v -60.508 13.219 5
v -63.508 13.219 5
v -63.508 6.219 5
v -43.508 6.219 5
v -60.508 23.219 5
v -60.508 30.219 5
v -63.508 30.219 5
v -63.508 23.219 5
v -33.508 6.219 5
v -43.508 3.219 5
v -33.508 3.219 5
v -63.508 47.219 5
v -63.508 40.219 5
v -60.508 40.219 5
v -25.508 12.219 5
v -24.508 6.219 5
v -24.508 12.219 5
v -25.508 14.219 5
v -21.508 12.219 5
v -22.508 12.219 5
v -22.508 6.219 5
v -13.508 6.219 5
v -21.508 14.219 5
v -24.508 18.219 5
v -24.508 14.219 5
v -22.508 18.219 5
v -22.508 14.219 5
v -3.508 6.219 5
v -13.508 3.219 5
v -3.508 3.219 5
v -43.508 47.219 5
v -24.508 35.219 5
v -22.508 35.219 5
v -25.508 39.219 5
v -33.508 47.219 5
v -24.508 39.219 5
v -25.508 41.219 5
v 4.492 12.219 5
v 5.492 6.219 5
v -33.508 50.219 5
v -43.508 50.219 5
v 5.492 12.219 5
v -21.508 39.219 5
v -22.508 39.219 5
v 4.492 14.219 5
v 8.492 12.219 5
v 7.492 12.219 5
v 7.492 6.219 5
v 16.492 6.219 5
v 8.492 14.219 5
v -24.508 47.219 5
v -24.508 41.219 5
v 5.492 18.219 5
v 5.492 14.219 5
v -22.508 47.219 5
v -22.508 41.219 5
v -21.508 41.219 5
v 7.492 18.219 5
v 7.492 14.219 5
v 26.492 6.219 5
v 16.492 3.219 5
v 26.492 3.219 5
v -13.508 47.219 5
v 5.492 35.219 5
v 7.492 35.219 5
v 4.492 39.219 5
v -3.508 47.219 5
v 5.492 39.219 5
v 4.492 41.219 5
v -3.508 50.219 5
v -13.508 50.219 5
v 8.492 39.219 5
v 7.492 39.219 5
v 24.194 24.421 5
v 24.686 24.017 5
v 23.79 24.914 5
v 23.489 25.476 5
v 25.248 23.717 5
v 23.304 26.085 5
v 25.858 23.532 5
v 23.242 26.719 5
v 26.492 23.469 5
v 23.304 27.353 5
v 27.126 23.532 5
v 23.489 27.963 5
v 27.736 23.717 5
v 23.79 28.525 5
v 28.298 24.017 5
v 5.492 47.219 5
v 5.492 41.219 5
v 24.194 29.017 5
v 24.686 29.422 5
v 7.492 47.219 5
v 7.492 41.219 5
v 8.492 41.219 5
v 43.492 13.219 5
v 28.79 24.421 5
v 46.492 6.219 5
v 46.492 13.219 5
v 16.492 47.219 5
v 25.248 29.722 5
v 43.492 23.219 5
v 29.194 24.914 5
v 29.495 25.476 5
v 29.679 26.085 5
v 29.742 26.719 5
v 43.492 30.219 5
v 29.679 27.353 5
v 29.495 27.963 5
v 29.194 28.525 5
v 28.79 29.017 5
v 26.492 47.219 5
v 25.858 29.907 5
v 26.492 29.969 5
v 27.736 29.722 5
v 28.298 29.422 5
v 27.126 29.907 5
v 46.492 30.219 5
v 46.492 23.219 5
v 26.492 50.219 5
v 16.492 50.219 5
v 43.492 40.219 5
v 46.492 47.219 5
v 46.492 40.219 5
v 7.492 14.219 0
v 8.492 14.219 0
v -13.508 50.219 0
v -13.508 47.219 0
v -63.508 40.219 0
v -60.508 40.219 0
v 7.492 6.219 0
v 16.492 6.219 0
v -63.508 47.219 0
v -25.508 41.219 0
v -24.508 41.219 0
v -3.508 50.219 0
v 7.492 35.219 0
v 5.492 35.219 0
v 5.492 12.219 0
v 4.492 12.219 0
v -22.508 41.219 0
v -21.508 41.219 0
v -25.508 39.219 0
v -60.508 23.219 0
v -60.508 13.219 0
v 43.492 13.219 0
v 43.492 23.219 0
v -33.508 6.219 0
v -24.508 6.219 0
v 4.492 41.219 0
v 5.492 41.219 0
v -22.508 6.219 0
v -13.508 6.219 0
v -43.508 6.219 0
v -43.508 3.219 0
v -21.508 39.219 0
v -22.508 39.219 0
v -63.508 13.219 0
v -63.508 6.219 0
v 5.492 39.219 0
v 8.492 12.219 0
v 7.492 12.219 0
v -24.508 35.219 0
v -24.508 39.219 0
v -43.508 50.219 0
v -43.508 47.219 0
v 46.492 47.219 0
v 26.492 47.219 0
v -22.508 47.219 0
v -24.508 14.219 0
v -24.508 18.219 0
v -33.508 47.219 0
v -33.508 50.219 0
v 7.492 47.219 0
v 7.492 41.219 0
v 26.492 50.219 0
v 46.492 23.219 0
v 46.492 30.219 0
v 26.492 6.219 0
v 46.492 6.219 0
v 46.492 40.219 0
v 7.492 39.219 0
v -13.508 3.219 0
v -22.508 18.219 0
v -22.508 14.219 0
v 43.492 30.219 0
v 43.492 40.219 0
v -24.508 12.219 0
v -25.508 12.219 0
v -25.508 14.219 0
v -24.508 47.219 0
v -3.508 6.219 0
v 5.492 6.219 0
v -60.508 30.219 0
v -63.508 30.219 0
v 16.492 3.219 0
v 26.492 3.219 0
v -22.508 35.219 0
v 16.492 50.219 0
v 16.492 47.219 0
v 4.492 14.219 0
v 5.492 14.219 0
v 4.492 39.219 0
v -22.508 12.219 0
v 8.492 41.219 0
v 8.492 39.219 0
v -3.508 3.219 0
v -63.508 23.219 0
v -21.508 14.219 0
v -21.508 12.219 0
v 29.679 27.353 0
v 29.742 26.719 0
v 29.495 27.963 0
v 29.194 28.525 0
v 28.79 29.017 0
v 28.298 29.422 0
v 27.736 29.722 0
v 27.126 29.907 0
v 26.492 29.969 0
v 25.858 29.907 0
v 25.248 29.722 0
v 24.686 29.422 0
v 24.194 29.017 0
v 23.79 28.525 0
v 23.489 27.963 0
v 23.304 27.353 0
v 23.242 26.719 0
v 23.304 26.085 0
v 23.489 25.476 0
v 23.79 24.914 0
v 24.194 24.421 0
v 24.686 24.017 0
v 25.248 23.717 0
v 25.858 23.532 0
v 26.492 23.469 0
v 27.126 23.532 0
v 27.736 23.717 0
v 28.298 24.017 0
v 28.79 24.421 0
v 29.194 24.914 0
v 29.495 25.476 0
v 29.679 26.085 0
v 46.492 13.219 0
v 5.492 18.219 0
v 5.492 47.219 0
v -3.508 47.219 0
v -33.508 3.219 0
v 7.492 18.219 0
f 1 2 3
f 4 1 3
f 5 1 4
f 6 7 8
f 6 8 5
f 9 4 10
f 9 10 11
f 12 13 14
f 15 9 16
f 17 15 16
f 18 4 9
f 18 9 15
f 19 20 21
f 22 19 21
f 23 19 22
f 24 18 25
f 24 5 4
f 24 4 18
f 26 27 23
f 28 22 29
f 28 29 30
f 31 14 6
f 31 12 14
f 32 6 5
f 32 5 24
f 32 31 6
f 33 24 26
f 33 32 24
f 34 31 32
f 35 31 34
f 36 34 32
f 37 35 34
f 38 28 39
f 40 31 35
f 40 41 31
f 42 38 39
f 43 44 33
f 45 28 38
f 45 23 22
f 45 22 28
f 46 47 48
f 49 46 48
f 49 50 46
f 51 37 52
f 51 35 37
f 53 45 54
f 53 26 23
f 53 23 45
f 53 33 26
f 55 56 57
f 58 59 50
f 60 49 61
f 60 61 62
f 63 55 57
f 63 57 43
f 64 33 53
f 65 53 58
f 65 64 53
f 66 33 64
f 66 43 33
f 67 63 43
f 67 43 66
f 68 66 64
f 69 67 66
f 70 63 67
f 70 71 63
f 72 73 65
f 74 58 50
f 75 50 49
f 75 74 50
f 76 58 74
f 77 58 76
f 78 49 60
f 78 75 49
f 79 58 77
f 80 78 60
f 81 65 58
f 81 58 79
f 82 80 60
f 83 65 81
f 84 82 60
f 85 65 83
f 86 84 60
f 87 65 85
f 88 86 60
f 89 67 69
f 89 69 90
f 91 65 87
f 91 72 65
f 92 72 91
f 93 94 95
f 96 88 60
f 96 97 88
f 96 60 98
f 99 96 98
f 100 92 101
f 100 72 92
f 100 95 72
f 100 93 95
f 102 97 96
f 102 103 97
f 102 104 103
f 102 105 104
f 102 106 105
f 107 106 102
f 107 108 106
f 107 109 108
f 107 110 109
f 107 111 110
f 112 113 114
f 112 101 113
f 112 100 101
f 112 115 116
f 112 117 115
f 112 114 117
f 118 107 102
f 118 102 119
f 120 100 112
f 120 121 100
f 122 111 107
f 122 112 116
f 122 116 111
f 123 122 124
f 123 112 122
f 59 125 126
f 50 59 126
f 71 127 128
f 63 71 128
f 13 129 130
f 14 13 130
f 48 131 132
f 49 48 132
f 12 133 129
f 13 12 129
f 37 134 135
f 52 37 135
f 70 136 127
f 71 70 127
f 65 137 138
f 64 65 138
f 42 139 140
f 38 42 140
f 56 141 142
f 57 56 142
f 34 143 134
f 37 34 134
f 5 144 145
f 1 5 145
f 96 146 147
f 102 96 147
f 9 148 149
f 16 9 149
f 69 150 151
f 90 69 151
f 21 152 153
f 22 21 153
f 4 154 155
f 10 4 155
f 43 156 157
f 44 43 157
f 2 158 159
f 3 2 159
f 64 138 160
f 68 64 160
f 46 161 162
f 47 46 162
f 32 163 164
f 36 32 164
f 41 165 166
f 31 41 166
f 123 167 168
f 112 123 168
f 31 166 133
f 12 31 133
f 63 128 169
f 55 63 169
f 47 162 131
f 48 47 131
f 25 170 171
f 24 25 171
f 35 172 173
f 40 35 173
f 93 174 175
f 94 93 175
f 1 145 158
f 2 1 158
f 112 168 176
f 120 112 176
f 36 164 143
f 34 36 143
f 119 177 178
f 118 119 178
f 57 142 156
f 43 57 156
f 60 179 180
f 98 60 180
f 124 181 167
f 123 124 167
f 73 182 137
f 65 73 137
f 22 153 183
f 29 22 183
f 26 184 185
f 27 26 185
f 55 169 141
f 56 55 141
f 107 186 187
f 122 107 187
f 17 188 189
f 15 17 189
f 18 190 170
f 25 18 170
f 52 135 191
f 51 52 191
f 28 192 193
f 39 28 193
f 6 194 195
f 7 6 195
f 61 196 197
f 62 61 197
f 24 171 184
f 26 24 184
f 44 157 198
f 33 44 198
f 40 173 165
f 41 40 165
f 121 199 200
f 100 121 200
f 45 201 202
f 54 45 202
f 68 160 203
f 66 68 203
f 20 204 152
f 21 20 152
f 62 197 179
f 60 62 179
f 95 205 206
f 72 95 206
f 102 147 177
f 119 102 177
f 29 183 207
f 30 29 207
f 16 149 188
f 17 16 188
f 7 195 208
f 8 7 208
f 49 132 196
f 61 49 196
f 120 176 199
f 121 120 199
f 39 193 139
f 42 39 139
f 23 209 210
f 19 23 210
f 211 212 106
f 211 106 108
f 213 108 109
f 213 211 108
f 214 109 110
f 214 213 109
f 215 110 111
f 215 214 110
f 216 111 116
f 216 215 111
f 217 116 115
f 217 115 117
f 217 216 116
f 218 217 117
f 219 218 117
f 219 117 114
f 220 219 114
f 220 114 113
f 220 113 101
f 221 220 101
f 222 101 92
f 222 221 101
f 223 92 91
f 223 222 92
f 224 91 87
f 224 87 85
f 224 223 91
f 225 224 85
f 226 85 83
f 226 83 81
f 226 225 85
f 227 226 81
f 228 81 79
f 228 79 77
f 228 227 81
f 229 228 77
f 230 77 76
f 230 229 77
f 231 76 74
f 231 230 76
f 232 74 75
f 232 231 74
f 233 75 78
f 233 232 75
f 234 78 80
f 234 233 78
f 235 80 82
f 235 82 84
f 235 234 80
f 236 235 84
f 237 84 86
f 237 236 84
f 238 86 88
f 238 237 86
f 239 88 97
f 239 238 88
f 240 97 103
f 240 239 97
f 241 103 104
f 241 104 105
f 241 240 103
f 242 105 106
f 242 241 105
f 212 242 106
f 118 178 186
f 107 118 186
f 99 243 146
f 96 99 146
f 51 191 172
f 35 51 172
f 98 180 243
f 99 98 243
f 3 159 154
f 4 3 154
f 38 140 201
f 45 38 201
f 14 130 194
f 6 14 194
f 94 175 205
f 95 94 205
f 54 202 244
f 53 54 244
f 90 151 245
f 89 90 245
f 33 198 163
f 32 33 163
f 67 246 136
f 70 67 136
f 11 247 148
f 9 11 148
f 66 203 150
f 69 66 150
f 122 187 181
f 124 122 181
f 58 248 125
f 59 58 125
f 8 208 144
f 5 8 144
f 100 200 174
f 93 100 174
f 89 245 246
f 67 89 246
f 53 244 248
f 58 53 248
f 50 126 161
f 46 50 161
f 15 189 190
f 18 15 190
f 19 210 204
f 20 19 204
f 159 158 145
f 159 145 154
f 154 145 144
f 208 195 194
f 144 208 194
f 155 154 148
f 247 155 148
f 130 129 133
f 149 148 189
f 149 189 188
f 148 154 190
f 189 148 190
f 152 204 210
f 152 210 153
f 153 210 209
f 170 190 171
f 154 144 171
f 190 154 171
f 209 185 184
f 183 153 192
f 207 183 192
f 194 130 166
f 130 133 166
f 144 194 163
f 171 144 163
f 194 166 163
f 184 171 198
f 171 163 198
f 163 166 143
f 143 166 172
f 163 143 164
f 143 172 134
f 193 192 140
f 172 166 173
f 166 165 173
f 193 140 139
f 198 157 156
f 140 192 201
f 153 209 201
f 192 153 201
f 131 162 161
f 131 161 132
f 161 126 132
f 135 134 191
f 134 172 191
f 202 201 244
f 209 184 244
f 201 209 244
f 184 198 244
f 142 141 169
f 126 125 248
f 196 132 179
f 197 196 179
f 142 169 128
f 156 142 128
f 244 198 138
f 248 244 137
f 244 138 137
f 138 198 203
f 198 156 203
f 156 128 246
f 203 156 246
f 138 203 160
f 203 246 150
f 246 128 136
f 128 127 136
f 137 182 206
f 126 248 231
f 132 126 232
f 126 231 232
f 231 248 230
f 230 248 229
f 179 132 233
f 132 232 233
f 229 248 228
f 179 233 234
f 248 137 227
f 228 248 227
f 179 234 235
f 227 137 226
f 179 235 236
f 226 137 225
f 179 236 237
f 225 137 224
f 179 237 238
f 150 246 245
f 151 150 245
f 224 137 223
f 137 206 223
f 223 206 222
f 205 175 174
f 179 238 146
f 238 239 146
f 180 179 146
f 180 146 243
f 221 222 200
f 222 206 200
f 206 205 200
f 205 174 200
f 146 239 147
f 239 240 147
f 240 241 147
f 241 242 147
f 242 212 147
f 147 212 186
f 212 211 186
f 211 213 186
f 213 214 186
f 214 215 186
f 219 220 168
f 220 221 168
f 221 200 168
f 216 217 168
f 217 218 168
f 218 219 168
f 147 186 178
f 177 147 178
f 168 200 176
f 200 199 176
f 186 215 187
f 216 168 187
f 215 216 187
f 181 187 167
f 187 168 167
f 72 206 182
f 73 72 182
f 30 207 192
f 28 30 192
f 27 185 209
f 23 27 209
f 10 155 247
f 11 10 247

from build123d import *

# Parameters (mm, degrees)
F0_R     = 3.25
F1_DEPTH = 5


with BuildPart() as f1:
    # F0 (on Top) → F1 (new body)
    with BuildSketch(Plane.XY):
        Polygon((-43.508064, 47.219317), (-63.508064, 47.219317), (-63.508064, 40.219317), (-60.508064, 40.219317), (-60.508064, 30.219317), (-63.508064, 30.219317), (-63.508064, 23.219317), (-60.508064, 23.219317), (-60.508064, 13.219317), (-63.508064, 13.219317), (-63.508064, 6.219317), (-43.508064, 6.219317), (-43.508064, 3.219317), (-33.508064, 3.219317), (-33.508064, 6.219317), (-24.508064, 6.219317), (-24.508064, 12.219317), (-25.508064, 12.219317), (-25.508064, 14.219317), (-24.508064, 14.219317), (-24.508064, 18.219317), (-22.508064, 18.219317), (-22.508064, 14.219317), (-21.508064, 14.219317), (-21.508064, 12.219317), (-22.508064, 12.219317), (-22.508064, 6.219317), (-13.508064, 6.219317), (-13.508064, 3.219317), (-3.508064, 3.219317), (-3.508064, 6.219317), (5.491936, 6.219317), (5.491936, 12.219317), (4.491936, 12.219317), (4.491936, 14.219317), (5.491936, 14.219317), (5.491936, 18.219317), (7.491936, 18.219317), (7.491936, 14.219317), (8.491936, 14.219317), (8.491936, 12.219317), (7.491936, 12.219317), (7.491936, 6.219317), (16.491936, 6.219317), (16.491936, 3.219317), (26.491936, 3.219317), (26.491936, 6.219317), (46.491936, 6.219317), (46.491936, 13.219317), (43.491936, 13.219317), (43.491936, 23.219317), (46.491936, 23.219317), (46.491936, 30.219317), (43.491936, 30.219317), (43.491936, 40.219317), (46.491936, 40.219317), (46.491936, 47.219317), (26.491936, 47.219317), (26.491936, 50.219317), (16.491936, 50.219317), (16.491936, 47.219317), (7.491936, 47.219317), (7.491936, 41.219317), (8.491936, 41.219317), (8.491936, 39.219317), (7.491936, 39.219317), (7.491936, 35.219317), (5.491936, 35.219317), (5.491936, 39.219317), (4.491936, 39.219317), (4.491936, 41.219317), (5.491936, 41.219317), (5.491936, 47.219317), (-3.508064, 47.219317), (-3.508064, 50.219317), (-13.508064, 50.219317), (-13.508064, 47.219317), (-22.508064, 47.219317), (-22.508064, 41.219317), (-21.508064, 41.219317), (-21.508064, 39.219317), (-22.508064, 39.219317), (-22.508064, 35.219317), (-24.508064, 35.219317), (-24.508064, 39.219317), (-25.508064, 39.219317), (-25.508064, 41.219317), (-24.508064, 41.219317), (-24.508064, 47.219317), (-33.508064, 47.219317), (-33.508064, 50.219317), (-43.508064, 50.219317), align=None)
        with Locations((26.491936, 26.719317)):
            Circle(F0_R, mode=Mode.SUBTRACT)
    extrude(amount=F1_DEPTH)


solid = f1.part
